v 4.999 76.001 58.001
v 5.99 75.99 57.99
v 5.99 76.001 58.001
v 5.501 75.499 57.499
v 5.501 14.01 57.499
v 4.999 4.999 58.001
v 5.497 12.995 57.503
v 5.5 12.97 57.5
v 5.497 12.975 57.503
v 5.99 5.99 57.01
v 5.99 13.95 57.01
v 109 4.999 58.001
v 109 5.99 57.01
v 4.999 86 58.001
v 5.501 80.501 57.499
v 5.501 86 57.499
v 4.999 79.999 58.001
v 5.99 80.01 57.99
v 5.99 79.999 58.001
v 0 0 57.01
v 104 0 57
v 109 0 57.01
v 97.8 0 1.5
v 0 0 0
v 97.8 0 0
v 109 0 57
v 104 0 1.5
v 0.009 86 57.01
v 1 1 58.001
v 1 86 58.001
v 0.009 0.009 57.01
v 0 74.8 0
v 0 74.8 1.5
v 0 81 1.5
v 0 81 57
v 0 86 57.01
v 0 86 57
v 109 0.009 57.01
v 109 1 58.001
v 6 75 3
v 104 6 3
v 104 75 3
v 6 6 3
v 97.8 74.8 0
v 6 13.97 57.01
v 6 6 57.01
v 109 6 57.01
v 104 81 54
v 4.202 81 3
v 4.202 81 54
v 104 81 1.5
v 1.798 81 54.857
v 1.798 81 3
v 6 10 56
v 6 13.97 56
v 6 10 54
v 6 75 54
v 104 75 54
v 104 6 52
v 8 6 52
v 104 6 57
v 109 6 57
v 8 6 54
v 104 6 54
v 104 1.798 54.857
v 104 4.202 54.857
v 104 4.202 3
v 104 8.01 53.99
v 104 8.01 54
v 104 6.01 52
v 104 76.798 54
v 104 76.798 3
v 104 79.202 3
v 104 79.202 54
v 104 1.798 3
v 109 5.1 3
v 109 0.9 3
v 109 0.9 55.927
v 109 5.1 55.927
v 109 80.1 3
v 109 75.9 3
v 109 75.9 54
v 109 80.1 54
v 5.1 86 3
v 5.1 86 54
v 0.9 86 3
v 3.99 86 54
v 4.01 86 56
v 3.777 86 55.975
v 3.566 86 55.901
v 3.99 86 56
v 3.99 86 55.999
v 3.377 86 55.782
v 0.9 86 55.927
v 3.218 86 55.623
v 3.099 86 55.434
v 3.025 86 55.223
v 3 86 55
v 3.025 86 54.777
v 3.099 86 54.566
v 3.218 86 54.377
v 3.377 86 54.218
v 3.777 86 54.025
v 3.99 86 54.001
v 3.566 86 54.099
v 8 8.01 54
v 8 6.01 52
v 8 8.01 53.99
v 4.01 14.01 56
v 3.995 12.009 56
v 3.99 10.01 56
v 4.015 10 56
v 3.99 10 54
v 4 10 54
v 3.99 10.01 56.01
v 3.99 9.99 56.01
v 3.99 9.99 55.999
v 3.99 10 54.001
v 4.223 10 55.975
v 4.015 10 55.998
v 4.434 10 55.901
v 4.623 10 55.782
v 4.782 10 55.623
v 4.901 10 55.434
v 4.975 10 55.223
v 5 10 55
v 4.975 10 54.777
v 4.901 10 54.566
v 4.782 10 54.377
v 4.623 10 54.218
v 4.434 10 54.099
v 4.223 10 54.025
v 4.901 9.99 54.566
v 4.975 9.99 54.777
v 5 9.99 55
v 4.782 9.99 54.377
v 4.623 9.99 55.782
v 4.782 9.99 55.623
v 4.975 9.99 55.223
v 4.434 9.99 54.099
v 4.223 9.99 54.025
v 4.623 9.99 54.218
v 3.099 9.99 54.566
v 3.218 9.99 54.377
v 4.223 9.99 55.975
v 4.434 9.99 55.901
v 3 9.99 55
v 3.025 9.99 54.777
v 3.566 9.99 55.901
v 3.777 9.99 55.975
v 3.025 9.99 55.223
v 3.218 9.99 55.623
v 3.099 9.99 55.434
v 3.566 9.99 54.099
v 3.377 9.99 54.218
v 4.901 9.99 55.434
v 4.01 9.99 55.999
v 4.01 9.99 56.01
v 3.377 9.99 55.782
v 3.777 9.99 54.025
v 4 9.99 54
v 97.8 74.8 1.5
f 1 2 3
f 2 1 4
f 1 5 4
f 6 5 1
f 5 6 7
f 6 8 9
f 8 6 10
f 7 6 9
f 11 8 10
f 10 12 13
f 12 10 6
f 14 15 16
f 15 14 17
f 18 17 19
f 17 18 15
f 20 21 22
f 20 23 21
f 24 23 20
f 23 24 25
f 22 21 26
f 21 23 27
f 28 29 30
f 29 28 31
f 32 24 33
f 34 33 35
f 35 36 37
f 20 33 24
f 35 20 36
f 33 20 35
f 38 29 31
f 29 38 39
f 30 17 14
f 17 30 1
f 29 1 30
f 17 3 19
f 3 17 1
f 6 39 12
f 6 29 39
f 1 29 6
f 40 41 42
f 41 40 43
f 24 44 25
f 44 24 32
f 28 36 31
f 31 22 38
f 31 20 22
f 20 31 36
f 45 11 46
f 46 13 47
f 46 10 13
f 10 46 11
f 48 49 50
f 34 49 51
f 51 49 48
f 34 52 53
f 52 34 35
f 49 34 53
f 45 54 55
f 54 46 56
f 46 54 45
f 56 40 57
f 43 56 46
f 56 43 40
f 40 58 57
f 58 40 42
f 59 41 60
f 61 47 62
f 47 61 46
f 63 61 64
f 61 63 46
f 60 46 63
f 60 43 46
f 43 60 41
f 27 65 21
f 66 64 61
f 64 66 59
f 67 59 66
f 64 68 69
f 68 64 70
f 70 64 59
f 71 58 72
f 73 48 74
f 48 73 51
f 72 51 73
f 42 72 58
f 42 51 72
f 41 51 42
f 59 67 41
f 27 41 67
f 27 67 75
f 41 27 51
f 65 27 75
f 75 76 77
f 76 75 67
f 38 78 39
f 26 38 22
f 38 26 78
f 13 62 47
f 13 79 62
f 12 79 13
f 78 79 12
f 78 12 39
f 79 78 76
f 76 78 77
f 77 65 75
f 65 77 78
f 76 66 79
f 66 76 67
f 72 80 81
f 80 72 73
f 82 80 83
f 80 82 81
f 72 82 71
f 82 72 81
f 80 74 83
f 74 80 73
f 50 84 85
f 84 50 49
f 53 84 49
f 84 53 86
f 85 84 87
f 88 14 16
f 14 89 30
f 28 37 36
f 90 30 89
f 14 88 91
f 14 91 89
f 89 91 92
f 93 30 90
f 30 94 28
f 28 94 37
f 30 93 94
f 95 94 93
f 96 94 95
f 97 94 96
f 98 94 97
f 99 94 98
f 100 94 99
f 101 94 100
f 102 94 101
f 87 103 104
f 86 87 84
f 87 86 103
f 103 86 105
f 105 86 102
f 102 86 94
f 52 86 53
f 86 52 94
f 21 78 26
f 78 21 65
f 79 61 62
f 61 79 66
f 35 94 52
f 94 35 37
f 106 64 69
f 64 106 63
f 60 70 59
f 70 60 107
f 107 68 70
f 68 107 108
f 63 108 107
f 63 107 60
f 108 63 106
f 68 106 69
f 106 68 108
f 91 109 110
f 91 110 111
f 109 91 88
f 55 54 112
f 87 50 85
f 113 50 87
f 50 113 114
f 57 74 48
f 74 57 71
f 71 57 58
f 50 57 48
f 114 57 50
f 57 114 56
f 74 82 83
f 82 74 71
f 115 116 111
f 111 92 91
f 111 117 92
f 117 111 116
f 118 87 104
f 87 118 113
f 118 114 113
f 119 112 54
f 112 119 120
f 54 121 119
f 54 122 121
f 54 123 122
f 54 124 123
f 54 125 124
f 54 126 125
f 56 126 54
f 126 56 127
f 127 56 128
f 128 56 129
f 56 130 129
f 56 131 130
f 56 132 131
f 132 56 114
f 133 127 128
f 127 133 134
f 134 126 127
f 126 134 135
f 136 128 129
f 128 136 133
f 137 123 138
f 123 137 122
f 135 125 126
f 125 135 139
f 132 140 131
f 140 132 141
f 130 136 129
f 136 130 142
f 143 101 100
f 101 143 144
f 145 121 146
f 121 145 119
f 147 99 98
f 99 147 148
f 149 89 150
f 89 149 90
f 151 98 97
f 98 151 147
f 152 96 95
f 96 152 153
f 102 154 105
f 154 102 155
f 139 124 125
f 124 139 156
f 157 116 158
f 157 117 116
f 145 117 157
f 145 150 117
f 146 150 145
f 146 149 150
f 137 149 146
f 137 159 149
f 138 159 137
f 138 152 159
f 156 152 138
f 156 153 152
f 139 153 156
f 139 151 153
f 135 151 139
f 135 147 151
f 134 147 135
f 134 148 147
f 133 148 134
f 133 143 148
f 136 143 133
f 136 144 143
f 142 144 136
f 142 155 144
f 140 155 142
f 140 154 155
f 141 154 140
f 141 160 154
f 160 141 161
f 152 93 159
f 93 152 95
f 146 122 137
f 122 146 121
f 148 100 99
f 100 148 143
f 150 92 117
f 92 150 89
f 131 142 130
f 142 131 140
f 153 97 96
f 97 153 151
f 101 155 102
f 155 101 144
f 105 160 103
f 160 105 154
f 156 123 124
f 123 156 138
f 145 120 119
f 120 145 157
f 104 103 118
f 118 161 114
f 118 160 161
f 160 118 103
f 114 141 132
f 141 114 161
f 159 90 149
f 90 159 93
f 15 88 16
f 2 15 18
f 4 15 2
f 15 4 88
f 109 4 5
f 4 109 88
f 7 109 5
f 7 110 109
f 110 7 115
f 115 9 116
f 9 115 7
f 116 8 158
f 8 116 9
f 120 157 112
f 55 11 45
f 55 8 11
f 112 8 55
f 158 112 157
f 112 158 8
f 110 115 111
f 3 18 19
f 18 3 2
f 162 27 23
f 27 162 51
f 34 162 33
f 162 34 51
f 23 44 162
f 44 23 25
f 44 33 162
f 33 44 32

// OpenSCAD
// ============================================================================
// cutlery_box.scad
// Graduated 3-chamber disposable-cutlery box (Option 3) — CUT-FROM-SOLID port
// of build_box.py, for a 120 x 120 x 120 mm printer (AOSEED).
//
// WHY THIS PORT EXISTS (the whole point):
//   The hand-mesh generator (build_box.py) could not keep the 1 mm rim chamfer
//   continuous across the female dovetail joints, because where a slot's flared
//   corner crosses the sloped chamfer it needs a true boolean intersection.
//   OpenSCAD HAS that boolean kernel, so here we do exactly the "cut-from-solid"
//   thing:
//      1. Build the ENTIRE box as ONE solid, WITH the chamfer already on it.
//      2. difference() out vertical dovetail prisms ( /_\ cross-section ),
//         running from just above the base plate up THROUGH the rim, to both
//         (a) form the sliding-dovetail joints, and
//         (b) split the box into 6 bed-sized pieces.
//   Because the cut is a real boolean through the already-chamfered solid, the
//   sloped chamfer<->slot edge is produced for free => the rim chamfer stays
//   CONTINUOUS across every joint, with none of the sliver hacks.
//
// ----------------------------------------------------------------------------
// HOW TO USE
//   In the app:  set `part` below (or use the Customizer dropdown), F5 to
//                preview, F6 to render, then File > Export > STL.
//   One piece (CLI):
//      openscad -o body_knife_A.stl -D 'part="knife_A"' cutlery_box.scad
//   ALL SIX (bash, run from this folder):
//      for p in knife_A knife_B fork_A fork_B spoon_A spoon_B; do \
//        openscad -o "body_$p.stl" -D "part=\"$p\"" cutlery_box.scad ; done
//   PNG preview of one piece:
//      openscad -o knife_B.png --imgsize=1400,1000 --autocenter --viewall \
//        -D 'part="knife_B"' cutlery_box.scad
//
//   Pieces are modelled in ASSEMBLED coordinates (floor-down, z=0 is the bed),
//   so importing all six STLs together shows the assembled box directly; your
//   slicer will auto-drop each one onto the plate for printing.
//
// BED SANITY: every piece is <= 120 mm in X, Y, Z.
//   Z = 58 mm. Widest piece = spoon at 117 mm (Y). A-halves reach 109 mm (X,
//   including the protruding dovetail key). All under 120.
//
// !! I could NOT run OpenSCAD to verify this file (no binary in my sandbox) !!
//   - The rim chamfer is a SMOOTH, true-45 bevel built from hull() frustums of
//     convex rectangles. Works in every OpenSCAD since ~2015 (incl. Homebrew
//     2021.01). No stepped staircase -- and, crucially, it makes box() a clean
//     well-formed solid so the per-part booleans resolve reliably (the old
//     14-slice staircase was fragile and CGAL was dropping the walls of the
//     interior parts, leaving only the key prisms => "floating boxes").
//   - roof() is still available behind USE_ROOF=true for those who have it
//     (2021.01+ snapshots); for THIS rectangular design it is identical, so it
//     is NOT required.
//   - After F6, check the console for "WARNING"/"not a valid 2-manifold".
//     If a tenon ever looks detached, bump EPS to 0.05.
// ============================================================================


/* [Part to render / export] */
part = "knife_A"; // [knife_A, knife_B, fork_A, fork_B, spoon_A, spoon_B, assembly]

/* [Chamfer method] */
// false = smooth hull() frustum bevel (default, any OpenSCAD); true = roof() (2021.01+)
USE_ROOF = false;

/* [Heights (mm)] */
BASE   = 3.0;     // floor / base-plate thickness
COMP_H = 55.0;    // interior wall height above the floor (cutlery stack depth)

/* [Walls (mm)] */
HOST_T   = 6.0;     // thickness of every wall (thick enough to host a dovetail)
HALF_LEN = 104.0;   // printed length of each half (A = near, B = far); <120 incl. key

/* [Chamber bays (mm)] */
N_COL     = 3;       // columns of cutlery per chamber
KNIFE_COL = 23.0;    // -> knife bay 69  (3 x 19 mm knives + play)
FORK_COL  = 33.0;    // -> fork  bay 99  (3 x 29 mm forks  + play)
SPOON_COL = 37.0;    // -> spoon bay 111 (3 x 34 mm spoons + play, trimmed <120)

/* [Dovetail joint (mm)] */
DT_DEPTH = 5.0;   // tail protrusion past the seam (male key depth)
DT_NECK  = 1.2;   // half-width at the seam face (narrow)
DT_FLARE = 2.1;   // half-width at the tip (wide -> locks)
DT_CLR   = 0.4;   // FLANK/seam slide clearance added to the female socket (do not change for fit)
DT_DEPTH_RELIEF = 0.3; // extra depth on the socket BACK only, so the tail tip never bottoms out

/* [Hidden-dovetail top cap / "hat" (mm)] */
// The dovetail otherwise shows its trapezoid outline on the TOP edge of the wall.
// To hide it, the MALE piece extends the wall's full-width top (chamfer included)
// across the key footprint -> a flush, continuous top. The FEMALE piece gets a
// matching top RECESS (cap footprint + CAP_CLR) so the cap drops straight in.
// Result: the top reads as one surface with a single straight seam line at the cap
// tip; the dovetail joinery lives entirely below the cap.
//
// SELF-SUPPORTING UNDERSIDE: the cap reaches the FULL wall width at the chamfer base
// (so the top edge reads as the wall extended, with NO recessed sliver on the outer
// face), and its underside is ONE planar ramp from the chamfer's OUTER CORNER
// (half-width HOST_T/2 at z = BODY_H-CHAMFER) down to the dovetail-neck half-width
// (CAP_FOOT) at CAP_SLANT_DEG from horizontal. No little horizontal step. The ramp
// reaching full width exactly at the chamfer base means "ramp top" == "chamfer base"
// (CAP_H is DERIVED). The FEMALE recess is the same ramp + CAP_CLR play.
// TRADEOFF: because the cap runs all the way to the outer corner, the female wall
// tapers to ~0 at z = BODY_H-CHAMFER -> a thin feather edge at the joint (gradual at
// CAP_SLANT_DEG, hidden inside the joint when assembled). Accepted per design intent.
CAP_SLANT_DEG = 50;     // cap underside ramp angle from horizontal (50 = self-supporting, long flare)
CAP_FOOT = DT_NECK;     // cap-underside half-width where it meets the dovetail neck
CAP_CLR = 0.3;          // slide clearance so the male cap seats into the female top recess

/* [Rim chamfer (mm)] */
CHAMFER = 1.0;    // 45-deg comfort break broken along the top wall edges

/* [Base half-lap / anti-warp (mm)] */
// Neighbouring base plates overlap as a HORIZONTAL half-lap (shiplap) at mid-base
// height, so corners stay coplanar (no lift/protrusion). Horizontal lap faces do
// NOT bind the vertical-drop assembly. Shingle direction: A->B and knife->fork->spoon.
LAP_LEN = 6;        // overlap past the A/B seam and the knife/fork seam
LAP_LEN_FS = 2;     // overlap past the fork/SPOON seam -- SMALLER: spoon is the
                    // tightest piece (117mm of the 120mm bed); a 6mm lap there
                    // would push spoon to 123mm. 2mm keeps spoon at 119mm.
LAP_Z   = BASE/2;   // 1.5 -- horizontal split height of the lap (bottom vs top half)
LAP_CLR = 0.2;      // in-plane clearance so the shelf isn't a press fit

/* [Lid — box features that receive a flat ORDERED clear sheet] */
// The lid itself is NOT printed: it's a flat ~2 mm PETG/Tritan sheet, bullnose-polished
// edges (r=LID_EDGE_R), ordered to size. We only model the box features that receive it.
LID_T            = 2.0;   // ordered sheet thickness
LID_EDGE_R       = 1.0;   // ordered sheet bullnose edge radius (for the sheet order spec)
LID_PLAY         = 0.4;   // total vertical play in the hinge groove (sheet + this)
LID_RECESS       = 2.0;   // lid TOP sits this far BELOW the rim, so the journal pocket is fully
                          // capped (rim caps the bullnose -> retains the lid when raised; tilt-in)
HINGE_AT_MINUS_X = true;  // hinge on the -x (303mm) end wall; clip on +x. (flip = mirror; default delivered)
// perimeter support ledge (lid underside rests on it at z = BODY_H-LID_T)
LEDGE_W          = 2.0;   // ledge inward protrusion (its underside ramps back at 45 deg -> self-supporting)
GROOVE_END_INSET = 4.0;   // journal stops 4mm short of each corner -> clean solid chamfered corner
                          // (removes the thin chamfer sliver + the cap hanging over the exposed bore)
GROOVE_TAPER     = 4.0;   // y-length over which the eased mouth tapers out at each groove end
// hinge journal (cut into the inner face of the hinge end wall, CONTINUOUS along the long edge)
GROOVE_DEPTH     = 3.0;   // 2mm lead-in slot + 1mm pocket radius -> journal sits 2mm back from the
                          // face so its cap clears the swing relief and RETAINS the lid
GROOVE_POCKET_R  = 1.0;   // journal half-cylinder radius (the bullnose sheet edge rolls in it)
// clip latch (one localized retainer, centered on the clip end wall)
CLIP_W           = 18.0;  // clip width
CLIP_LIP         = 0.4;   // retaining overhang (0.3 light .. 0.6 firm)
CLIP_RAMP_H      = 1.6;   // cam-ramp height above the rim (press-to-close)
// finger scallop (semicircular dish in the rim, centered on & aligned with the clip)
SCALLOP_W        = 16.0;  // scallop width
SCALLOP_DEPTH    = 6.0;   // how far it dishes down from the rim


/* [Hidden] */
EPS      = 0.01;          // tiny overlap so abutting solids fuse cleanly in CGAL
// Upper-chamber pieces (fork, spoon) were cut by a cell plane laid EXACTLY on the
// divider wall's far face (the lower chamber owns that wall). intersection() along a
// plane coincident with an existing box face makes CGAL leave a ZERO-THICKNESS copy
// of the wall face -> edge-manifold + "watertight" but degenerate (OpenSCAD shows it
// as a blue back-face; Tinkercad thickens it into a phantom block). SEAM_EPS nudges
// those cut planes a hair INTO the open bay so they no longer coincide with any box
// face -> no flap. 0.02 mm is physically nothing but is well clear of CGAL's tolerance.
SEAM_EPS = 0.02;
CUT_OVER = 1.0;           // how far dovetail cutters overshoot the rim (clean cut)

BODY_H    = BASE + COMP_H;     // 58  total height
END_WALL  = HOST_T;            // end walls are dovetail hosts too -> equally thick
TOTAL_LEN = 2 * HALF_LEN;      // 208 assembled length (end wall .. end wall)

// hidden-cap ramp geometry (derived).
//   CAP_HW    = cap MAX half-width = HOST_T/2 (the full wall edge) at the chamfer base.
//   CAP_RISE  = vertical height of the self-supporting CAP_SLANT_DEG underside ramp.
//   CAP_ZRAMP = where the cap reaches full width = the chamfer base (BODY_H-CHAMFER), so
//               the ramp runs straight to the chamfer OUTER CORNER (no horizontal step).
//   CAP_ZBOT  = cap bottom = ramp start; CAP_H derived from it (for reference/report).
//   CAP_ZRAMP_R = recess ramp top, shifted down by CAP_CLR so the recess ramp stays
//               parallel to the cap ramp with uniform play.
CAP_HW      = HOST_T/2;   // cap reaches the FULL wall edge at the chamfer base
CAP_RISE    = (CAP_HW - CAP_FOOT) * tan(CAP_SLANT_DEG);
CAP_ZRAMP   = BODY_H - CHAMFER;               // full width exactly at the chamfer base / outer corner
CAP_ZBOT    = CAP_ZRAMP - CAP_RISE;
CAP_H       = BODY_H - CAP_ZBOT;              // derived; reported
CAP_ZRAMP_R = CAP_ZRAMP;   // recess ramp ALSO tops at the chamfer corner (mirror the cap) -> no vertical lip
// sanity checks
assert(CAP_ZBOT > BASE + 1,
       "cap zone dips too low -- raise CAP_SLANT_DEG");
assert(CAP_HW >= DT_FLARE,
       "cap too narrow to cover the dovetail tail");

// NOTE: lid-derived constants are defined BELOW the Y-layout block, because some of
// them (INTERIOR_Y0/Y1, CLIP_CY) depend on OUTER_L / OUTER_R / EXT_W. See "lid derived".

// bay widths
KNIFE_BAY = N_COL * KNIFE_COL; // 69
FORK_BAY  = N_COL * FORK_COL;  // 99
SPOON_BAY = N_COL * SPOON_COL; // 111

// ---- Y layout (width direction): wall | bay | divider | bay | divider | bay | wall
KNIFE_Y0 = 0;
KNIFE_Y1 = HOST_T + KNIFE_BAY + HOST_T;        // 0..81   (outer wall + bay + divider)
FORK_Y0  = KNIFE_Y1;                           // 81
FORK_Y1  = FORK_Y0 + FORK_BAY + HOST_T;        // 81..186 (bay + divider)
SPOON_Y0 = FORK_Y1;                            // 186
SPOON_Y1 = SPOON_Y0 + SPOON_BAY + HOST_T;      // 186..303(bay + outer wall)
EXT_W    = SPOON_Y1;                           // 303 total width

// lengthwise wall Y-bands [y0,y1] (host the A/B dovetails) + their centers
OUTER_L  = [0, HOST_T];                                       // [0,6]    c=3
DIV_KF   = [HOST_T + KNIFE_BAY, HOST_T + KNIFE_BAY + HOST_T]; // [75,81]  c=78
DIV_FS   = [FORK_Y0 + FORK_BAY, FORK_Y0 + FORK_BAY + HOST_T]; // [180,186]c=183
OUTER_R  = [SPOON_Y1 - HOST_T, SPOON_Y1];                     // [297,303]c=300

// ---- lid derived ---- (placed AFTER OUTER_L/OUTER_R/EXT_W so nothing is forward-referenced)
LID_TOP_Z   = BODY_H - LID_RECESS;        // 56  lid TOP (recessed); rim z=58 rises LID_RECESS above it
LID_Z_UNDER = LID_TOP_Z - LID_T;          // 54  lid underside / ledge top / lowered-divider top
POCKET_CZ   = LID_TOP_Z - LID_T/2;        // 55  journal centre (lid mid) -> pocket top = LID_TOP_Z = capped
// hinge end-wall inner face x + inward direction; clip end-wall inner face x + inward dir
HINGE_INX   = HINGE_AT_MINUS_X ? END_WALL : TOTAL_LEN - END_WALL;       // 6  (default)
HINGE_IN    = HINGE_AT_MINUS_X ? 1 : -1;  // interior direction from the hinge wall (+x default)
CLIP_INX    = HINGE_AT_MINUS_X ? TOTAL_LEN - END_WALL : END_WALL;       // 202 (default)
CLIP_IN     = HINGE_AT_MINUS_X ? -1 : 1;  // interior direction from the clip wall (-x default)
POCKET_CX   = HINGE_INX - HINGE_IN*(GROOVE_DEPTH - GROOVE_POCKET_R);    // 5  pocket centre x (INTO the wall)
INTERIOR_Y0 = OUTER_L[1];                 // 6   inner face of the -y short wall
INTERIOR_Y1 = OUTER_R[0];                 // 297 inner face of the +y short wall
CLIP_CY     = EXT_W/2;                     // 151.5 clip/scallop centre (in the fork chamber)
assert(POCKET_CZ - GROOVE_POCKET_R > BASE + 1,
       "journal dips too low -- reduce LID_RECESS or LID_T");
assert(POCKET_CZ + GROOVE_POCKET_R <= LID_TOP_Z + EPS,
       "journal not capped -- lower the lid (raise LID_RECESS) or shrink GROOVE_POCKET_R");
// NOTE: with LID_RECESS the lid underside (and lowered dividers) sit BELOW CAP_ZBOT. That is
// intended: the inner dividers are cut flat below the cap zone (their hidden caps are removed,
// but the lid covers them); the perimeter/end-wall caps are untouched (full-height walls).

// the three OPEN bays are rectangular holes in the wall footprint:
//   footprint = outer rectangle MINUS these bays  (== the 6 walls; verified).
// The smooth chamfer is built from exactly this decomposition.
BAY_X0 = END_WALL;              // 6
BAY_X1 = TOTAL_LEN - END_WALL;  // 202
BAYS = [
    [BAY_X0, BAY_X1, HOST_T,   HOST_T + KNIFE_BAY],   // knife bay [6,202] x [6,75]
    [BAY_X0, BAY_X1, FORK_Y0,  FORK_Y0 + FORK_BAY],   // fork  bay [6,202] x [81,180]
    [BAY_X0, BAY_X1, SPOON_Y0, SPOON_Y0 + SPOON_BAY], // spoon bay [6,202] x [186,297]
];

YC_OUTL  = OUTER_L[0] + HOST_T/2;   // 3   outer-left wall center
YC_DIVKF = DIV_KF[0]  + HOST_T/2;   // 78  knife/fork divider center
YC_DIVFS = DIV_FS[0]  + HOST_T/2;   // 183 fork/spoon divider center
YC_OUTR  = OUTER_R[0] + HOST_T/2;   // 300 outer-right wall center

// seams
AB_SEAM = HALF_LEN;               // 104  A/B length seam (x)
SEAM_KF = FORK_Y0;                // 81   knife/fork width seam (y)
SEAM_FS = SPOON_Y0;              // 186  fork/spoon width seam (y)
ENDC_A  = END_WALL/2;             // 3    A end-wall center (x) -> chamber dovetails
ENDC_B  = TOTAL_LEN - END_WALL/2; // 205  B end-wall center (x)


// ============================================================================
// 2D wall footprint (cross-section of all walls, constant in z for the straight
// part). Union of: 2 full-width end walls + 4 lengthwise walls between them.
// ============================================================================
module wall_footprint_2d() {
    // footprint = outer rectangle minus the 3 open bays  (== the 6 walls)
    difference() {
        square([TOTAL_LEN, EXT_W]);
        for (b = BAYS) translate([b[0], b[2]]) square([b[1] - b[0], b[3] - b[2]]);
    }
}

// ============================================================================
// The full chamfered box solid = base plate + walls with a continuous 1 mm
// top-rim chamfer. Built ONCE; every piece is carved out of this.
// ============================================================================
module chamfer_cap() {
    // SMOOTH 45 rim chamfer over z[BODY_H-CHAMFER, BODY_H], in absolute coords.
    zm = BODY_H - CHAMFER;
    if (USE_ROOF) {
        // exact straight-skeleton roof, capped at CHAMFER height (needs roof()).
        intersection() {
            translate([0,0,zm]) roof() wall_footprint_2d();
            translate([0,0,zm]) linear_extrude(CHAMFER + EPS) wall_footprint_2d();
        }
    } else {
        // DEFAULT: true 45 bevel as hull() frustums of CONVEX rectangles -> smooth
        // AND a clean manifold.  Since footprint = outer - bays, the chamfer of the
        // footprint = (outer rectangle beveled inward) MINUS (each bay beveled so it
        // grows toward the top, which bevels every bay-facing rim).  All hull()s are
        // on convex rectangles, so nothing gets convex-filled.
        difference() {
            // outer perimeter frustum: full outer rect at zm -> inset by CHAMFER at top
            hull() {
                translate([0,0,zm])     linear_extrude(0.001) square([TOTAL_LEN, EXT_W]);
                translate([0,0,BODY_H]) linear_extrude(0.001) offset(delta=-CHAMFER) square([TOTAL_LEN, EXT_W]);
            }
            // each bay grows by CHAMFER toward the top -> bevels its surrounding rim.
            // (overshoots z a hair past both ends so the cut is clean.)
            for (b = BAYS)
                hull() {
                    translate([0,0,zm-EPS])     linear_extrude(0.001)
                        translate([b[0],b[2]]) offset(delta=-EPS)        square([b[1]-b[0], b[3]-b[2]]);
                    translate([0,0,BODY_H+EPS]) linear_extrude(0.001)
                        translate([b[0],b[2]]) offset(delta=CHAMFER+EPS) square([b[1]-b[0], b[3]-b[2]]);
                }
        }
    }
}

module box() {
    zm = BODY_H - CHAMFER;
    union() {
        cube([TOTAL_LEN, EXT_W, BASE]);                                        // base plate z[0,3]
        translate([0,0,BASE]) linear_extrude(zm - BASE + EPS) wall_footprint_2d(); // straight walls z[3,57]
        chamfer_cap();                                                         // smooth chamfer z[57,58]
    }
}

// ============================================================================
// Dovetail prisms ( /_\ ). Vertical, z[BASE, BODY_H+CUT_OVER] so they cut
// through the rim but leave the base plate continuous. The near face is pushed
// back EPS so a male key always fuses to its wall.
//   male key   : half_n=DT_NECK,         half_f=DT_FLARE
//   female slot: half_n=DT_NECK+DT_CLR,  half_f=DT_FLARE+DT_CLR
// ============================================================================
module dt_prism_X(seam_x, yc, half_n, half_f) {   // perpendicular to X, grows +X
    translate([0,0,BASE]) linear_extrude(BODY_H - BASE + CUT_OVER)
        polygon([[seam_x - EPS,        yc - half_n],
                 [seam_x + DT_DEPTH,   yc - half_f],
                 [seam_x + DT_DEPTH,   yc + half_f],
                 [seam_x - EPS,        yc + half_n]]);
}
module dt_prism_Y(seam_y, xc, half_n, half_f) {   // perpendicular to Y, grows +Y
    translate([0,0,BASE]) linear_extrude(BODY_H - BASE + CUT_OVER)
        polygon([[xc - half_n, seam_y - EPS],
                 [xc - half_f, seam_y + DT_DEPTH],
                 [xc + half_f, seam_y + DT_DEPTH],
                 [xc + half_n, seam_y - EPS]]);
}
module ab_key   (yc)        { dt_prism_X(AB_SEAM, yc, DT_NECK, DT_FLARE); }
module ch_key   (seam_y, xc){ dt_prism_Y(seam_y, xc, DT_NECK, DT_FLARE); }

// Female sockets = male + DT_CLR on the flanks/seam (unchanged), PLUS a straight
// back-face relief of DT_DEPTH_RELIEF so the tail tip never bottoms out. The
// relief is a rectangle tacked onto the trapezoid's tip at the SAME flare width,
// so the angled flank faces (and their 0.4 mm slide clearance) are untouched.
module ab_socket(yc) {
    dt_prism_X(AB_SEAM, yc, DT_NECK + DT_CLR, DT_FLARE + DT_CLR);
    translate([0,0,BASE]) linear_extrude(BODY_H - BASE + CUT_OVER)
        translate([AB_SEAM + DT_DEPTH, yc - (DT_FLARE + DT_CLR)])
            square([DT_DEPTH_RELIEF, 2*(DT_FLARE + DT_CLR)]);          // back relief, +X
}
module ch_socket(seam_y, xc) {
    dt_prism_Y(seam_y, xc, DT_NECK + DT_CLR, DT_FLARE + DT_CLR);
    translate([0,0,BASE]) linear_extrude(BODY_H - BASE + CUT_OVER)
        translate([xc - (DT_FLARE + DT_CLR), seam_y + DT_DEPTH])
            square([2*(DT_FLARE + DT_CLR), DT_DEPTH_RELIEF]);          // back relief, +Y
}

// ===== hidden-dovetail top cap ("hat"), SELF-SUPPORTING underside ===============
// MALE cap: a FULL-wall-width hat whose underside is ONE planar ramp from the chamfer's
// OUTER CORNER (half-width CAP_HW = HOST_T/2 at CAP_ZRAMP = BODY_H-CHAMFER) down to the
// dovetail-neck half-width (CAP_FOOT) at CAP_SLANT_DEG from horizontal -> the self-
// supporting shoulder, running straight to the corner (no horizontal step). Built as
// hull(narrow bottom slab buried in the tail neck, full-width top slab through the rim);
// box() trims it to the wall and adds the continuous rim chamfer for free, so the outer
// top edge reads as the wall extended (no recessed sliver). The protruding NOSE is left
// SQUARE (vertical) -- hidden in the female socket when assembled.
// TRADEOFF: the female wall tapers to ~0 at z=BODY_H-CHAMFER (a thin feather edge at the
// joint, gradual at CAP_SLANT_DEG) -- accepted per design intent.
module ab_cap(yc) {   // A/B seam, grows +X past the seam (length direction)
    hull() {
        translate([AB_SEAM - EPS, yc - CAP_FOOT, CAP_ZBOT])
            cube([DT_DEPTH + EPS, 2*CAP_FOOT, EPS]);
        translate([AB_SEAM - EPS, yc - CAP_HW,   CAP_ZRAMP])
            cube([DT_DEPTH + EPS, 2*CAP_HW, (BODY_H + CUT_OVER) - CAP_ZRAMP]);
    }
}
module ch_cap(seam_y, xc) {   // chamber seam, grows +Y past the seam (in the end wall)
    hull() {
        translate([xc - CAP_FOOT, seam_y - EPS, CAP_ZBOT])
            cube([2*CAP_FOOT, DT_DEPTH + EPS, EPS]);
        translate([xc - CAP_HW,   seam_y - EPS, CAP_ZRAMP])
            cube([2*CAP_HW, DT_DEPTH + EPS, (BODY_H + CUT_OVER) - CAP_ZRAMP]);
    }
}
// FEMALE recess: the SAME ramp grown by CAP_CLR (flanks, tip, floor, and ramp shifted down
// by CAP_CLR so it stays parallel) -> the cap seats with uniform slide clearance. It opens
// to the wall edge (and a hair past, into air) so the cap's full-width corner drops in;
// this is what leaves the thin female feather at the top (accepted). Open upward + toward seam.
module ab_cap_neg(yc) {
    hull() {
        translate([AB_SEAM - EPS, yc - (CAP_FOOT + CAP_CLR), CAP_ZBOT - CAP_CLR])
            cube([DT_DEPTH + CAP_CLR + EPS, 2*(CAP_FOOT + CAP_CLR), EPS]);
        translate([AB_SEAM - EPS, yc - (CAP_HW + EPS), CAP_ZRAMP_R])
            cube([DT_DEPTH + CAP_CLR + EPS, 2*(CAP_HW + EPS), (BODY_H + CUT_OVER + 1) - CAP_ZRAMP_R]);
    }
}
module ch_cap_neg(seam_y, xc) {
    hull() {
        translate([xc - (CAP_FOOT + CAP_CLR), seam_y - EPS, CAP_ZBOT - CAP_CLR])
            cube([2*(CAP_FOOT + CAP_CLR), DT_DEPTH + CAP_CLR + EPS, EPS]);
        translate([xc - (CAP_HW + EPS), seam_y - EPS, CAP_ZRAMP_R])
            cube([2*(CAP_HW + EPS), DT_DEPTH + CAP_CLR + EPS, (BODY_H + CUT_OVER + 1) - CAP_ZRAMP_R]);
    }
}

// rectangular cell (x[xa,xb], y[ya,yb], full height + margin) used to split pieces
module cell(xa, xb, ya, yb) {
    translate([xa, ya, -1]) cube([xb - xa, yb - ya, BODY_H + 11]);
}

// ===== base half-lap (shiplap) =================================================
// HORIZONTAL lap at mid-base height: the shelf-owner keeps its BOTTOM half
// (z 0..LAP_Z) extending LAP_LEN past the seam; the neighbour has its bottom half
// REMOVED there (keeps only the top half) and lands flat on the shelf. Horizontal
// faces => no binding during the vertical drop. Shelves live entirely in the base
// (z < BASE), well clear of the wall dovetails (z >= BASE).
// Shingle = FEMALE-first (matches the no-notch dovetail assembly order, which
// lowers the male piece onto the female): the B half owns the A/B shelf (grows
// -X into A) and the UPPER chamber (fork, spoon) owns the chamber shelf (grows
// -Y into the lower chamber).  Order: spoon, fork, knife; B before A.
module lap_shelf_X(y0, y1) {                 // B-side shelf, grows -X into A past AB_SEAM
    // +EPS past AB_SEAM so the shelf interpenetrates (not just abuts) its own B body -> fuses cleanly.
    translate([AB_SEAM - LAP_LEN, y0, 0]) cube([LAP_LEN + EPS, y1 - y0, LAP_Z]);
}
module lap_neg_X(y0, y1) {                   // A-side: remove bottom half to receive it
    translate([AB_SEAM - LAP_LEN - LAP_CLR, y0 - EPS, -EPS])
        cube([LAP_LEN + LAP_CLR + EPS, (y1 - y0) + 2*EPS, LAP_Z + EPS]);
}
module lap_shelf_Y(seam_y, x0, x1, ln=LAP_LEN) {   // upper-chamber shelf, grows -Y into lower
    // grows -Y by `ln` into the lower chamber AND +Y by 2*SEAM_EPS past the seam so it
    // always overlaps the (SEAM_EPS-nudged) body floor and stays fused -> no floating shelf.
    translate([x0, seam_y - ln, 0]) cube([x1 - x0, ln + 2*SEAM_EPS, LAP_Z]);
}
module lap_neg_Y(seam_y, x0, x1, ln=LAP_LEN) {     // lower-chamber: remove bottom half
    translate([x0 - EPS, seam_y - ln - LAP_CLR, -EPS])
        cube([(x1 - x0) + 2*EPS, ln + LAP_CLR + EPS, LAP_Z + EPS]);
}

// ============================================================================
// LID FEATURES (receive a flat ORDERED clear sheet; the sheet is not printed).
// All features live at the TOP (z >= ~52), ABOVE the dovetail engagement, the half-lap
// (z<1.5) and most of the hat, so the vertical-drop assembly and joints are untouched.
// EPS overlaps throughout; no coincident coplanar faces with the existing walls.
// Default orientation: HINGE on the -x end wall (A pieces), CLIP on the +x end wall
// (B pieces), clip+scallop centred on the fork (middle) chamber.
// ============================================================================

// --- perimeter support ledge: 45-deg self-supporting brackets; rest face at LID_Z_UNDER.
//     Runs along the CLIP end wall + the two short outer walls. (Hinge wall uses the groove.)
//     Built as hull(thin top edge, wall column) -> a triangular bracket whose underside is
//     a 45-deg ramp (prints floor-down with no support). ADDED to each piece (clipped by cell).
//     Each run is INSET by LEDGE_W from the perpendicular walls so the three brackets never
//     overlap at a corner and the wall's normal chamfer wraps every corner uninterrupted.
module lid_ledge() {
    cy0 = INTERIOR_Y0 + LEDGE_W;  cy1 = INTERIOR_Y1 - LEDGE_W;  cyl = cy1 - cy0;   // clip-run y span (inset)
    sx0 = END_WALL    + LEDGE_W;  sxl = (TOTAL_LEN - 2*END_WALL) - 2*LEDGE_W;       // short-run x span (inset)
    // clip end wall (x = CLIP_INX), bracket protrudes toward interior (CLIP_IN)
    hull() {
        translate([CLIP_INX + CLIP_IN*LEDGE_W, cy0, LID_Z_UNDER - EPS]) cube([EPS, cyl, EPS]);
        translate([CLIP_INX - EPS,             cy0, LID_Z_UNDER - LEDGE_W]) cube([2*EPS, cyl, LEDGE_W]);
    }
    // OUTER_L short wall (y = INTERIOR_Y0), bracket protrudes +y
    hull() {
        translate([sx0, INTERIOR_Y0 + LEDGE_W, LID_Z_UNDER - EPS]) cube([sxl, EPS, EPS]);
        translate([sx0, INTERIOR_Y0 - EPS,     LID_Z_UNDER - LEDGE_W]) cube([sxl, 2*EPS, LEDGE_W]);
    }
    // OUTER_R short wall (y = INTERIOR_Y1), bracket protrudes -y
    hull() {
        translate([sx0, INTERIOR_Y1 - LEDGE_W, LID_Z_UNDER - EPS]) cube([sxl, EPS, EPS]);
        translate([sx0, INTERIOR_Y1 - EPS,     LID_Z_UNDER - LEDGE_W]) cube([sxl, 2*EPS, LEDGE_W]);
    }
}

// --- hinge groove: a lead-in slot + a journal half-cylinder pocket, CAPPED at the recessed
//     lid top (LID_TOP_Z). The rim (z[LID_TOP_Z,BODY_H]) caps the bullnose so the lid is
//     RETAINED when raised. Insertion is TILT-IN: raise the lid to the open angle, slide the
//     bullnose under the cap into the journal, swing down to close. A 45-deg mouth-ease
//     relieves the cap's inner-bottom edge (corner at HINGE_INX, LID_TOP_Z) so the lid clears
//     as it swings; the relief TAPERS to nothing over GROOVE_TAPER at each end (clean corners).
//     CONTINUOUS along the long edge (y ~8..295); shaves only the top inner tips of the two
//     chamber dovetails -- engagement below the journal and the ~3mm outer wall remain.
// Relief = ONE straight ramp from the journal's inner-top (POCKET_CX, LID_TOP_Z) up to the
// inner rim (HINGE_INX, BODY_H). No kink; the ~45-deg ramp is self-supporting (prints clean);
// the cap stays full directly over the bullnose (x=POCKET_CX) so retention survives; the relief
// grows toward the inner edge, matching the lid's rotation about the journal.
module mouth_tri() {
    polygon([[POCKET_CX,                LID_TOP_Z - EPS],
             [HINGE_INX + HINGE_IN*EPS, LID_TOP_Z - EPS],
             [HINGE_INX + HINGE_IN*EPS, BODY_H + EPS]]);
}
module mouth_slab(yc, dy) {                          // thin ramp slice centred at yc
    translate([0, yc - dy/2, 0]) rotate([90,0,0]) translate([0,0,-dy]) linear_extrude(dy) mouth_tri();
}
module mouth_taper(yApex, yFull) {                   // relief tapers to nothing at yApex (the ramp apex)
    hull() {
        mouth_slab(yFull, 2*EPS);
        translate([POCKET_CX - EPS, yApex - EPS, LID_TOP_Z - EPS]) cube([2*EPS, 2*EPS, 2*EPS]);
    }
}
module hinge_groove() {
    gy0 = INTERIOR_Y0 + GROOVE_END_INSET;            // 8    start (inset past the corner chamfer)
    gy1 = INTERIOR_Y1 - GROOVE_END_INSET;            // 295  end
    sx0 = min(POCKET_CX, HINGE_INX);  sx1 = max(POCKET_CX, HINGE_INX);   // x[4,6]: 2mm lead-in
    // lead-in slot (sheet thickness, capped at the lid top) from the journal out to the inner face
    translate([sx0 - EPS, gy0, LID_Z_UNDER]) cube([sx1 - sx0 + 2*EPS, gy1 - gy0, LID_TOP_Z - LID_Z_UNDER]);
    // journal half-cylinder 2mm back from the face -> its cap (x[3,5]) clears the relief => retains the lid
    translate([POCKET_CX, gy0 - EPS, POCKET_CZ]) rotate([-90,0,0]) cylinder(h = gy1 - gy0 + 2*EPS, r = GROOVE_POCKET_R, $fn = 28);
    // eased mouth (relieves the cap inner-bottom corner): full middle prism + tapered ends
    mt = min(GROOVE_TAPER, (gy1 - gy0)/2 - EPS);
    translate([0, gy0 + mt, 0]) rotate([90,0,0]) translate([0,0,-((gy1 - mt) - (gy0 + mt))]) linear_extrude((gy1 - mt) - (gy0 + mt)) mouth_tri();
    mouth_taper(gy0, gy0 + mt);                       // taper out at the -y corner
    mouth_taper(gy1, gy1 - mt);                       // taper out at the +y corner
}

// --- lower the inner chamber dividers to the lid underside (mid-support, no sag).
//     Removes the divider top over the full length; outer walls keep full height.
module divider_lower() {
    // x-span is the CHAMBER BAY only [BAY_X0, BAY_X1] (+EPS overlap into the end walls so the
    // cut is manifold). The end/outer walls keep their full BODY_H tops; only the two INNER
    // dividers (DIV_KF, DIV_FS) are lowered.
    translate([BAY_X0 - EPS, DIV_KF[0], LID_Z_UNDER]) cube([BAY_X1 - BAY_X0 + 2*EPS, HOST_T, BODY_H - LID_Z_UNDER + CUT_OVER]);
    translate([BAY_X0 - EPS, DIV_FS[0], LID_Z_UNDER]) cube([BAY_X1 - BAY_X0 + 2*EPS, HOST_T, BODY_H - LID_Z_UNDER + CUT_OVER]);
}

// --- retaining clip (ADDED): a lip on the clip end wall, centred on CLIP_CY, that overhangs
//     the RECESSED lid top (LID_TOP_Z) by CLIP_LIP and holds it down. A lead-in ramp above the
//     lip (up to LID_TOP_Z+CLIP_RAMP_H, still below the rim) cams the lid under as it swings
//     closed. Anchored into the wall (x = CLIP_INX-CLIP_IN*HOST_T/2). Added AFTER the scallop
//     cut so the scallop never undercuts it. No longer protrudes above the rim.
module lid_clip() {
    translate([0, CLIP_CY - CLIP_W/2, 0]) rotate([90,0,0]) translate([0,0,-CLIP_W]) linear_extrude(CLIP_W)
        polygon([[CLIP_INX - CLIP_IN*HOST_T/2, LID_TOP_Z - 0.8],         // anchor low, into the wall (fuse)
                 [CLIP_INX + CLIP_IN*CLIP_LIP, LID_TOP_Z],               // lip tip: overhang over the lid top
                 [CLIP_INX + CLIP_IN*CLIP_LIP, LID_TOP_Z + 0.4],         // lip front
                 [CLIP_INX - CLIP_IN*HOST_T/2, LID_TOP_Z + CLIP_RAMP_H]]);// lead-in ramp up into the wall
}

// --- finger scallop (CUT): a semicircular dish in the rim's INNER edge at the clip, so a
//     fingertip reaches under the lid edge to release it. Interior half only (does not
//     touch the wall body or the clip's anchor).
module lid_scallop() {
    intersection() {
        translate([CLIP_INX, CLIP_CY, BODY_H - SCALLOP_DEPTH]) cylinder(h = SCALLOP_DEPTH + EPS, r = SCALLOP_W/2, $fn = 40);
        translate([CLIP_INX + (CLIP_IN<0 ? -SCALLOP_W : 0), CLIP_CY - SCALLOP_W, BODY_H - SCALLOP_DEPTH - EPS])
            cube([SCALLOP_W, 2*SCALLOP_W, SCALLOP_DEPTH + 2*EPS]);
    }
}

// ============================================================================
// The six pieces.  piece = intersection(box, cell + own male keys) - own sockets
//   A halves are MALE on the A/B seam (keep the key); B halves are FEMALE (slot).
//   On a chamber seam the LEFT chamber is male (+Y), the right chamber is female.
// ============================================================================
// Base half-lap shingling (FEMALE-first, Option 1):
//   A/B seam  -> the B half owns the bottom shelf (grows -X), A has the negative.
//   chamber   -> the UPPER chamber (fork, spoon) owns the shelf (grows -Y); the
//                lower chamber (knife, fork) has the negative.
//   Assembly order: spoon, fork, knife; B before A (male lowered onto female).
// Center crossings (104,81)&(104,186): the CHAMBER shelf (fork_A / spoon_A) owns the
//   crossing square; the B-half A/B shelf (knife_B / fork_B) is CLIPPED short of the
//   chamber seam by LAP_LEN so two shelves never collide.
module knife_A() {                                       // placed LAST; receives everything
    difference() {
        union() {
            intersection() {
                box();
                union() {
                    cell(-1, AB_SEAM, KNIFE_Y0 - 1, KNIFE_Y1);
                    ab_key(YC_OUTL); ab_key(YC_DIVKF); ch_key(SEAM_KF, ENDC_A);
                    ab_cap(YC_OUTL); ab_cap(YC_DIVKF); ch_cap(SEAM_KF, ENDC_A);  // hide tops (male)
                }
            }
            intersection() { lid_ledge(); cell(-1, AB_SEAM, KNIFE_Y0 - 1, KNIFE_Y1); }  // lid support ledge
        }
        lap_neg_X(KNIFE_Y0, KNIFE_Y1);            // receive knife_B's A/B shelf
        lap_neg_Y(SEAM_KF, 0, AB_SEAM);           // receive fork_A's chamber shelf
        hinge_groove(); divider_lower(); lid_scallop();   // lid cuts (groove hits A pieces; divider/scallop where present)
    }
}

module knife_B() {
    difference() {
        union() {
            intersection() {
                box();
                union() {
                    cell(AB_SEAM, TOTAL_LEN + 1, KNIFE_Y0 - 1, KNIFE_Y1);
                    ch_key(SEAM_KF, ENDC_B);
                    ch_cap(SEAM_KF, ENDC_B);                // hide top (male, chamber)
                }
            }
            lap_shelf_X(KNIFE_Y0, KNIFE_Y1 - LAP_LEN);  // A/B shelf -> knife_A (CLIPPED at y=81 crossing)
            intersection() { lid_ledge(); cell(AB_SEAM, TOTAL_LEN + 1, KNIFE_Y0 - 1, KNIFE_Y1); }  // lid support ledge
        }
        ab_socket(YC_OUTL); ab_socket(YC_DIVKF);
        ab_cap_neg(YC_OUTL); ab_cap_neg(YC_DIVKF);      // top recesses to receive knife_A's caps (female)
        lap_neg_Y(SEAM_KF, AB_SEAM, TOTAL_LEN);         // receive fork_B's chamber shelf
        hinge_groove(); divider_lower(); lid_scallop();   // lid cuts
    }
}

module fork_A() {
    difference() {
        union() {
            intersection() {
                box();
                union() {
                    cell(-1, AB_SEAM, FORK_Y0 + SEAM_EPS, FORK_Y1);  // -Y cut nudged off the divider face
                    ab_key(YC_DIVFS); ch_key(SEAM_FS, ENDC_A);
                    ab_cap(YC_DIVFS); ch_cap(SEAM_FS, ENDC_A);       // hide tops (male)
                }
            }
            lap_shelf_Y(SEAM_KF, 0, AB_SEAM);           // chamber shelf -> knife_A (owns crossing)
            intersection() { lid_ledge(); cell(-1, AB_SEAM, FORK_Y0 + SEAM_EPS, FORK_Y1); }  // lid support ledge (none in fork-A)
        }
        lap_neg_X(FORK_Y0, FORK_Y1);                    // receive fork_B's A/B shelf
        ch_socket(SEAM_KF, ENDC_A);
        ch_cap_neg(SEAM_KF, ENDC_A);                    // top recess to receive knife_A's chamber cap (female)
        lap_neg_Y(SEAM_FS, 0, AB_SEAM, LAP_LEN_FS);     // receive spoon_A's (small) chamber shelf
        hinge_groove(); divider_lower(); lid_scallop();   // lid cuts (groove = fork-A hinge segment; divider = DIV_FS)
    }
}

module fork_B() {
    union() {
        difference() {
            union() {
                intersection() {
                    box();
                    union() {
                        cell(AB_SEAM, TOTAL_LEN + 1, FORK_Y0 + SEAM_EPS, FORK_Y1);  // -Y cut nudged off the divider face
                        ch_key(SEAM_FS, ENDC_B);
                        ch_cap(SEAM_FS, ENDC_B);                // hide top (male, chamber)
                    }
                }
                lap_shelf_X(FORK_Y0, FORK_Y1 - LAP_LEN_FS); // A/B shelf -> fork_A (CLIPPED at y=186 crossing)
                lap_shelf_Y(SEAM_KF, AB_SEAM, TOTAL_LEN);   // chamber shelf -> knife_B
                intersection() { lid_ledge(); cell(AB_SEAM, TOTAL_LEN + 1, FORK_Y0 + SEAM_EPS, FORK_Y1); }  // lid ledge (clip-end run)
            }
            ab_socket(YC_DIVFS);
            ab_cap_neg(YC_DIVFS);                           // top recess to receive fork_A's A/B cap (female)
            ch_socket(SEAM_KF, ENDC_B);
            ch_cap_neg(SEAM_KF, ENDC_B);                    // top recess to receive knife_B's chamber cap (female)
            lap_neg_Y(SEAM_FS, AB_SEAM, TOTAL_LEN, LAP_LEN_FS); // receive spoon_B's (small) chamber shelf
            hinge_groove(); divider_lower(); lid_scallop();     // lid cuts (scallop lands here)
        }
        intersection() { lid_clip(); cell(AB_SEAM, TOTAL_LEN + 1, FORK_Y0 + SEAM_EPS, FORK_Y1); }  // retaining clip, added AFTER the scallop cut
    }
}

module spoon_A() {
    difference() {
        union() {
            intersection() {
                box();
                union() {
                    cell(-1, AB_SEAM, SPOON_Y0 + SEAM_EPS, SPOON_Y1 + 1);  // -Y cut nudged off the divider face
                    ab_key(YC_OUTR);
                    ab_cap(YC_OUTR);                        // hide top (male)
                }
            }
            lap_shelf_Y(SEAM_FS, 0, AB_SEAM, LAP_LEN_FS); // chamber shelf -> fork_A (small; owns crossing)
            intersection() { lid_ledge(); cell(-1, AB_SEAM, SPOON_Y0 + SEAM_EPS, SPOON_Y1 + 1); }  // lid support ledge (OUTER_R run)
        }
        lap_neg_X(SPOON_Y0, SPOON_Y1);                  // receive spoon_B's A/B shelf
        ch_socket(SEAM_FS, ENDC_A);
        ch_cap_neg(SEAM_FS, ENDC_A);                    // top recess to receive fork_A's chamber cap (female)
        hinge_groove(); divider_lower(); lid_scallop();   // lid cuts (groove = spoon-A hinge segment)
    }
}

module spoon_B() {                                      // placed FIRST; owns shelves
    difference() {
        union() {
            intersection() {
                box();
                union() {
                    cell(AB_SEAM, TOTAL_LEN + 1, SPOON_Y0 + SEAM_EPS, SPOON_Y1 + 1);  // -Y cut nudged off the divider face
                }
            }
            lap_shelf_X(SPOON_Y0, SPOON_Y1);            // A/B shelf -> spoon_A
            lap_shelf_Y(SEAM_FS, AB_SEAM, TOTAL_LEN, LAP_LEN_FS); // chamber shelf -> fork_B (small)
            intersection() { lid_ledge(); cell(AB_SEAM, TOTAL_LEN + 1, SPOON_Y0 + SEAM_EPS, SPOON_Y1 + 1); }  // lid ledge (OUTER_R + clip-end runs)
        }
        ab_socket(YC_OUTR);
        ab_cap_neg(YC_OUTR);                            // top recess to receive spoon_A's A/B cap (female)
        ch_socket(SEAM_FS, ENDC_B);
        ch_cap_neg(SEAM_FS, ENDC_B);                    // top recess to receive fork_B's chamber cap (female)
        hinge_groove(); divider_lower(); lid_scallop();   // lid cuts
    }
}

// Fast preview: the full continuous-chamfer box (no cuts). The six part modules
// above are the real, separable pieces. To instead see the TRUE assembled
// pieces with their joints (slower — 6 booleans), replace box(); below with:
//   knife_A(); knife_B(); fork_A(); fork_B(); spoon_A(); spoon_B();
module assembly() {
    box();
}

// ============================================================================
// Render dispatch
// ============================================================================
if      (part == "knife_A")  knife_A();
else if (part == "knife_B")  knife_B();
else if (part == "fork_A")   fork_A();
else if (part == "fork_B")   fork_B();
else if (part == "spoon_A")  spoon_A();
else if (part == "spoon_B")  spoon_B();
else if (part == "assembly") assembly();
else echo(str("Unknown part: ", part));
